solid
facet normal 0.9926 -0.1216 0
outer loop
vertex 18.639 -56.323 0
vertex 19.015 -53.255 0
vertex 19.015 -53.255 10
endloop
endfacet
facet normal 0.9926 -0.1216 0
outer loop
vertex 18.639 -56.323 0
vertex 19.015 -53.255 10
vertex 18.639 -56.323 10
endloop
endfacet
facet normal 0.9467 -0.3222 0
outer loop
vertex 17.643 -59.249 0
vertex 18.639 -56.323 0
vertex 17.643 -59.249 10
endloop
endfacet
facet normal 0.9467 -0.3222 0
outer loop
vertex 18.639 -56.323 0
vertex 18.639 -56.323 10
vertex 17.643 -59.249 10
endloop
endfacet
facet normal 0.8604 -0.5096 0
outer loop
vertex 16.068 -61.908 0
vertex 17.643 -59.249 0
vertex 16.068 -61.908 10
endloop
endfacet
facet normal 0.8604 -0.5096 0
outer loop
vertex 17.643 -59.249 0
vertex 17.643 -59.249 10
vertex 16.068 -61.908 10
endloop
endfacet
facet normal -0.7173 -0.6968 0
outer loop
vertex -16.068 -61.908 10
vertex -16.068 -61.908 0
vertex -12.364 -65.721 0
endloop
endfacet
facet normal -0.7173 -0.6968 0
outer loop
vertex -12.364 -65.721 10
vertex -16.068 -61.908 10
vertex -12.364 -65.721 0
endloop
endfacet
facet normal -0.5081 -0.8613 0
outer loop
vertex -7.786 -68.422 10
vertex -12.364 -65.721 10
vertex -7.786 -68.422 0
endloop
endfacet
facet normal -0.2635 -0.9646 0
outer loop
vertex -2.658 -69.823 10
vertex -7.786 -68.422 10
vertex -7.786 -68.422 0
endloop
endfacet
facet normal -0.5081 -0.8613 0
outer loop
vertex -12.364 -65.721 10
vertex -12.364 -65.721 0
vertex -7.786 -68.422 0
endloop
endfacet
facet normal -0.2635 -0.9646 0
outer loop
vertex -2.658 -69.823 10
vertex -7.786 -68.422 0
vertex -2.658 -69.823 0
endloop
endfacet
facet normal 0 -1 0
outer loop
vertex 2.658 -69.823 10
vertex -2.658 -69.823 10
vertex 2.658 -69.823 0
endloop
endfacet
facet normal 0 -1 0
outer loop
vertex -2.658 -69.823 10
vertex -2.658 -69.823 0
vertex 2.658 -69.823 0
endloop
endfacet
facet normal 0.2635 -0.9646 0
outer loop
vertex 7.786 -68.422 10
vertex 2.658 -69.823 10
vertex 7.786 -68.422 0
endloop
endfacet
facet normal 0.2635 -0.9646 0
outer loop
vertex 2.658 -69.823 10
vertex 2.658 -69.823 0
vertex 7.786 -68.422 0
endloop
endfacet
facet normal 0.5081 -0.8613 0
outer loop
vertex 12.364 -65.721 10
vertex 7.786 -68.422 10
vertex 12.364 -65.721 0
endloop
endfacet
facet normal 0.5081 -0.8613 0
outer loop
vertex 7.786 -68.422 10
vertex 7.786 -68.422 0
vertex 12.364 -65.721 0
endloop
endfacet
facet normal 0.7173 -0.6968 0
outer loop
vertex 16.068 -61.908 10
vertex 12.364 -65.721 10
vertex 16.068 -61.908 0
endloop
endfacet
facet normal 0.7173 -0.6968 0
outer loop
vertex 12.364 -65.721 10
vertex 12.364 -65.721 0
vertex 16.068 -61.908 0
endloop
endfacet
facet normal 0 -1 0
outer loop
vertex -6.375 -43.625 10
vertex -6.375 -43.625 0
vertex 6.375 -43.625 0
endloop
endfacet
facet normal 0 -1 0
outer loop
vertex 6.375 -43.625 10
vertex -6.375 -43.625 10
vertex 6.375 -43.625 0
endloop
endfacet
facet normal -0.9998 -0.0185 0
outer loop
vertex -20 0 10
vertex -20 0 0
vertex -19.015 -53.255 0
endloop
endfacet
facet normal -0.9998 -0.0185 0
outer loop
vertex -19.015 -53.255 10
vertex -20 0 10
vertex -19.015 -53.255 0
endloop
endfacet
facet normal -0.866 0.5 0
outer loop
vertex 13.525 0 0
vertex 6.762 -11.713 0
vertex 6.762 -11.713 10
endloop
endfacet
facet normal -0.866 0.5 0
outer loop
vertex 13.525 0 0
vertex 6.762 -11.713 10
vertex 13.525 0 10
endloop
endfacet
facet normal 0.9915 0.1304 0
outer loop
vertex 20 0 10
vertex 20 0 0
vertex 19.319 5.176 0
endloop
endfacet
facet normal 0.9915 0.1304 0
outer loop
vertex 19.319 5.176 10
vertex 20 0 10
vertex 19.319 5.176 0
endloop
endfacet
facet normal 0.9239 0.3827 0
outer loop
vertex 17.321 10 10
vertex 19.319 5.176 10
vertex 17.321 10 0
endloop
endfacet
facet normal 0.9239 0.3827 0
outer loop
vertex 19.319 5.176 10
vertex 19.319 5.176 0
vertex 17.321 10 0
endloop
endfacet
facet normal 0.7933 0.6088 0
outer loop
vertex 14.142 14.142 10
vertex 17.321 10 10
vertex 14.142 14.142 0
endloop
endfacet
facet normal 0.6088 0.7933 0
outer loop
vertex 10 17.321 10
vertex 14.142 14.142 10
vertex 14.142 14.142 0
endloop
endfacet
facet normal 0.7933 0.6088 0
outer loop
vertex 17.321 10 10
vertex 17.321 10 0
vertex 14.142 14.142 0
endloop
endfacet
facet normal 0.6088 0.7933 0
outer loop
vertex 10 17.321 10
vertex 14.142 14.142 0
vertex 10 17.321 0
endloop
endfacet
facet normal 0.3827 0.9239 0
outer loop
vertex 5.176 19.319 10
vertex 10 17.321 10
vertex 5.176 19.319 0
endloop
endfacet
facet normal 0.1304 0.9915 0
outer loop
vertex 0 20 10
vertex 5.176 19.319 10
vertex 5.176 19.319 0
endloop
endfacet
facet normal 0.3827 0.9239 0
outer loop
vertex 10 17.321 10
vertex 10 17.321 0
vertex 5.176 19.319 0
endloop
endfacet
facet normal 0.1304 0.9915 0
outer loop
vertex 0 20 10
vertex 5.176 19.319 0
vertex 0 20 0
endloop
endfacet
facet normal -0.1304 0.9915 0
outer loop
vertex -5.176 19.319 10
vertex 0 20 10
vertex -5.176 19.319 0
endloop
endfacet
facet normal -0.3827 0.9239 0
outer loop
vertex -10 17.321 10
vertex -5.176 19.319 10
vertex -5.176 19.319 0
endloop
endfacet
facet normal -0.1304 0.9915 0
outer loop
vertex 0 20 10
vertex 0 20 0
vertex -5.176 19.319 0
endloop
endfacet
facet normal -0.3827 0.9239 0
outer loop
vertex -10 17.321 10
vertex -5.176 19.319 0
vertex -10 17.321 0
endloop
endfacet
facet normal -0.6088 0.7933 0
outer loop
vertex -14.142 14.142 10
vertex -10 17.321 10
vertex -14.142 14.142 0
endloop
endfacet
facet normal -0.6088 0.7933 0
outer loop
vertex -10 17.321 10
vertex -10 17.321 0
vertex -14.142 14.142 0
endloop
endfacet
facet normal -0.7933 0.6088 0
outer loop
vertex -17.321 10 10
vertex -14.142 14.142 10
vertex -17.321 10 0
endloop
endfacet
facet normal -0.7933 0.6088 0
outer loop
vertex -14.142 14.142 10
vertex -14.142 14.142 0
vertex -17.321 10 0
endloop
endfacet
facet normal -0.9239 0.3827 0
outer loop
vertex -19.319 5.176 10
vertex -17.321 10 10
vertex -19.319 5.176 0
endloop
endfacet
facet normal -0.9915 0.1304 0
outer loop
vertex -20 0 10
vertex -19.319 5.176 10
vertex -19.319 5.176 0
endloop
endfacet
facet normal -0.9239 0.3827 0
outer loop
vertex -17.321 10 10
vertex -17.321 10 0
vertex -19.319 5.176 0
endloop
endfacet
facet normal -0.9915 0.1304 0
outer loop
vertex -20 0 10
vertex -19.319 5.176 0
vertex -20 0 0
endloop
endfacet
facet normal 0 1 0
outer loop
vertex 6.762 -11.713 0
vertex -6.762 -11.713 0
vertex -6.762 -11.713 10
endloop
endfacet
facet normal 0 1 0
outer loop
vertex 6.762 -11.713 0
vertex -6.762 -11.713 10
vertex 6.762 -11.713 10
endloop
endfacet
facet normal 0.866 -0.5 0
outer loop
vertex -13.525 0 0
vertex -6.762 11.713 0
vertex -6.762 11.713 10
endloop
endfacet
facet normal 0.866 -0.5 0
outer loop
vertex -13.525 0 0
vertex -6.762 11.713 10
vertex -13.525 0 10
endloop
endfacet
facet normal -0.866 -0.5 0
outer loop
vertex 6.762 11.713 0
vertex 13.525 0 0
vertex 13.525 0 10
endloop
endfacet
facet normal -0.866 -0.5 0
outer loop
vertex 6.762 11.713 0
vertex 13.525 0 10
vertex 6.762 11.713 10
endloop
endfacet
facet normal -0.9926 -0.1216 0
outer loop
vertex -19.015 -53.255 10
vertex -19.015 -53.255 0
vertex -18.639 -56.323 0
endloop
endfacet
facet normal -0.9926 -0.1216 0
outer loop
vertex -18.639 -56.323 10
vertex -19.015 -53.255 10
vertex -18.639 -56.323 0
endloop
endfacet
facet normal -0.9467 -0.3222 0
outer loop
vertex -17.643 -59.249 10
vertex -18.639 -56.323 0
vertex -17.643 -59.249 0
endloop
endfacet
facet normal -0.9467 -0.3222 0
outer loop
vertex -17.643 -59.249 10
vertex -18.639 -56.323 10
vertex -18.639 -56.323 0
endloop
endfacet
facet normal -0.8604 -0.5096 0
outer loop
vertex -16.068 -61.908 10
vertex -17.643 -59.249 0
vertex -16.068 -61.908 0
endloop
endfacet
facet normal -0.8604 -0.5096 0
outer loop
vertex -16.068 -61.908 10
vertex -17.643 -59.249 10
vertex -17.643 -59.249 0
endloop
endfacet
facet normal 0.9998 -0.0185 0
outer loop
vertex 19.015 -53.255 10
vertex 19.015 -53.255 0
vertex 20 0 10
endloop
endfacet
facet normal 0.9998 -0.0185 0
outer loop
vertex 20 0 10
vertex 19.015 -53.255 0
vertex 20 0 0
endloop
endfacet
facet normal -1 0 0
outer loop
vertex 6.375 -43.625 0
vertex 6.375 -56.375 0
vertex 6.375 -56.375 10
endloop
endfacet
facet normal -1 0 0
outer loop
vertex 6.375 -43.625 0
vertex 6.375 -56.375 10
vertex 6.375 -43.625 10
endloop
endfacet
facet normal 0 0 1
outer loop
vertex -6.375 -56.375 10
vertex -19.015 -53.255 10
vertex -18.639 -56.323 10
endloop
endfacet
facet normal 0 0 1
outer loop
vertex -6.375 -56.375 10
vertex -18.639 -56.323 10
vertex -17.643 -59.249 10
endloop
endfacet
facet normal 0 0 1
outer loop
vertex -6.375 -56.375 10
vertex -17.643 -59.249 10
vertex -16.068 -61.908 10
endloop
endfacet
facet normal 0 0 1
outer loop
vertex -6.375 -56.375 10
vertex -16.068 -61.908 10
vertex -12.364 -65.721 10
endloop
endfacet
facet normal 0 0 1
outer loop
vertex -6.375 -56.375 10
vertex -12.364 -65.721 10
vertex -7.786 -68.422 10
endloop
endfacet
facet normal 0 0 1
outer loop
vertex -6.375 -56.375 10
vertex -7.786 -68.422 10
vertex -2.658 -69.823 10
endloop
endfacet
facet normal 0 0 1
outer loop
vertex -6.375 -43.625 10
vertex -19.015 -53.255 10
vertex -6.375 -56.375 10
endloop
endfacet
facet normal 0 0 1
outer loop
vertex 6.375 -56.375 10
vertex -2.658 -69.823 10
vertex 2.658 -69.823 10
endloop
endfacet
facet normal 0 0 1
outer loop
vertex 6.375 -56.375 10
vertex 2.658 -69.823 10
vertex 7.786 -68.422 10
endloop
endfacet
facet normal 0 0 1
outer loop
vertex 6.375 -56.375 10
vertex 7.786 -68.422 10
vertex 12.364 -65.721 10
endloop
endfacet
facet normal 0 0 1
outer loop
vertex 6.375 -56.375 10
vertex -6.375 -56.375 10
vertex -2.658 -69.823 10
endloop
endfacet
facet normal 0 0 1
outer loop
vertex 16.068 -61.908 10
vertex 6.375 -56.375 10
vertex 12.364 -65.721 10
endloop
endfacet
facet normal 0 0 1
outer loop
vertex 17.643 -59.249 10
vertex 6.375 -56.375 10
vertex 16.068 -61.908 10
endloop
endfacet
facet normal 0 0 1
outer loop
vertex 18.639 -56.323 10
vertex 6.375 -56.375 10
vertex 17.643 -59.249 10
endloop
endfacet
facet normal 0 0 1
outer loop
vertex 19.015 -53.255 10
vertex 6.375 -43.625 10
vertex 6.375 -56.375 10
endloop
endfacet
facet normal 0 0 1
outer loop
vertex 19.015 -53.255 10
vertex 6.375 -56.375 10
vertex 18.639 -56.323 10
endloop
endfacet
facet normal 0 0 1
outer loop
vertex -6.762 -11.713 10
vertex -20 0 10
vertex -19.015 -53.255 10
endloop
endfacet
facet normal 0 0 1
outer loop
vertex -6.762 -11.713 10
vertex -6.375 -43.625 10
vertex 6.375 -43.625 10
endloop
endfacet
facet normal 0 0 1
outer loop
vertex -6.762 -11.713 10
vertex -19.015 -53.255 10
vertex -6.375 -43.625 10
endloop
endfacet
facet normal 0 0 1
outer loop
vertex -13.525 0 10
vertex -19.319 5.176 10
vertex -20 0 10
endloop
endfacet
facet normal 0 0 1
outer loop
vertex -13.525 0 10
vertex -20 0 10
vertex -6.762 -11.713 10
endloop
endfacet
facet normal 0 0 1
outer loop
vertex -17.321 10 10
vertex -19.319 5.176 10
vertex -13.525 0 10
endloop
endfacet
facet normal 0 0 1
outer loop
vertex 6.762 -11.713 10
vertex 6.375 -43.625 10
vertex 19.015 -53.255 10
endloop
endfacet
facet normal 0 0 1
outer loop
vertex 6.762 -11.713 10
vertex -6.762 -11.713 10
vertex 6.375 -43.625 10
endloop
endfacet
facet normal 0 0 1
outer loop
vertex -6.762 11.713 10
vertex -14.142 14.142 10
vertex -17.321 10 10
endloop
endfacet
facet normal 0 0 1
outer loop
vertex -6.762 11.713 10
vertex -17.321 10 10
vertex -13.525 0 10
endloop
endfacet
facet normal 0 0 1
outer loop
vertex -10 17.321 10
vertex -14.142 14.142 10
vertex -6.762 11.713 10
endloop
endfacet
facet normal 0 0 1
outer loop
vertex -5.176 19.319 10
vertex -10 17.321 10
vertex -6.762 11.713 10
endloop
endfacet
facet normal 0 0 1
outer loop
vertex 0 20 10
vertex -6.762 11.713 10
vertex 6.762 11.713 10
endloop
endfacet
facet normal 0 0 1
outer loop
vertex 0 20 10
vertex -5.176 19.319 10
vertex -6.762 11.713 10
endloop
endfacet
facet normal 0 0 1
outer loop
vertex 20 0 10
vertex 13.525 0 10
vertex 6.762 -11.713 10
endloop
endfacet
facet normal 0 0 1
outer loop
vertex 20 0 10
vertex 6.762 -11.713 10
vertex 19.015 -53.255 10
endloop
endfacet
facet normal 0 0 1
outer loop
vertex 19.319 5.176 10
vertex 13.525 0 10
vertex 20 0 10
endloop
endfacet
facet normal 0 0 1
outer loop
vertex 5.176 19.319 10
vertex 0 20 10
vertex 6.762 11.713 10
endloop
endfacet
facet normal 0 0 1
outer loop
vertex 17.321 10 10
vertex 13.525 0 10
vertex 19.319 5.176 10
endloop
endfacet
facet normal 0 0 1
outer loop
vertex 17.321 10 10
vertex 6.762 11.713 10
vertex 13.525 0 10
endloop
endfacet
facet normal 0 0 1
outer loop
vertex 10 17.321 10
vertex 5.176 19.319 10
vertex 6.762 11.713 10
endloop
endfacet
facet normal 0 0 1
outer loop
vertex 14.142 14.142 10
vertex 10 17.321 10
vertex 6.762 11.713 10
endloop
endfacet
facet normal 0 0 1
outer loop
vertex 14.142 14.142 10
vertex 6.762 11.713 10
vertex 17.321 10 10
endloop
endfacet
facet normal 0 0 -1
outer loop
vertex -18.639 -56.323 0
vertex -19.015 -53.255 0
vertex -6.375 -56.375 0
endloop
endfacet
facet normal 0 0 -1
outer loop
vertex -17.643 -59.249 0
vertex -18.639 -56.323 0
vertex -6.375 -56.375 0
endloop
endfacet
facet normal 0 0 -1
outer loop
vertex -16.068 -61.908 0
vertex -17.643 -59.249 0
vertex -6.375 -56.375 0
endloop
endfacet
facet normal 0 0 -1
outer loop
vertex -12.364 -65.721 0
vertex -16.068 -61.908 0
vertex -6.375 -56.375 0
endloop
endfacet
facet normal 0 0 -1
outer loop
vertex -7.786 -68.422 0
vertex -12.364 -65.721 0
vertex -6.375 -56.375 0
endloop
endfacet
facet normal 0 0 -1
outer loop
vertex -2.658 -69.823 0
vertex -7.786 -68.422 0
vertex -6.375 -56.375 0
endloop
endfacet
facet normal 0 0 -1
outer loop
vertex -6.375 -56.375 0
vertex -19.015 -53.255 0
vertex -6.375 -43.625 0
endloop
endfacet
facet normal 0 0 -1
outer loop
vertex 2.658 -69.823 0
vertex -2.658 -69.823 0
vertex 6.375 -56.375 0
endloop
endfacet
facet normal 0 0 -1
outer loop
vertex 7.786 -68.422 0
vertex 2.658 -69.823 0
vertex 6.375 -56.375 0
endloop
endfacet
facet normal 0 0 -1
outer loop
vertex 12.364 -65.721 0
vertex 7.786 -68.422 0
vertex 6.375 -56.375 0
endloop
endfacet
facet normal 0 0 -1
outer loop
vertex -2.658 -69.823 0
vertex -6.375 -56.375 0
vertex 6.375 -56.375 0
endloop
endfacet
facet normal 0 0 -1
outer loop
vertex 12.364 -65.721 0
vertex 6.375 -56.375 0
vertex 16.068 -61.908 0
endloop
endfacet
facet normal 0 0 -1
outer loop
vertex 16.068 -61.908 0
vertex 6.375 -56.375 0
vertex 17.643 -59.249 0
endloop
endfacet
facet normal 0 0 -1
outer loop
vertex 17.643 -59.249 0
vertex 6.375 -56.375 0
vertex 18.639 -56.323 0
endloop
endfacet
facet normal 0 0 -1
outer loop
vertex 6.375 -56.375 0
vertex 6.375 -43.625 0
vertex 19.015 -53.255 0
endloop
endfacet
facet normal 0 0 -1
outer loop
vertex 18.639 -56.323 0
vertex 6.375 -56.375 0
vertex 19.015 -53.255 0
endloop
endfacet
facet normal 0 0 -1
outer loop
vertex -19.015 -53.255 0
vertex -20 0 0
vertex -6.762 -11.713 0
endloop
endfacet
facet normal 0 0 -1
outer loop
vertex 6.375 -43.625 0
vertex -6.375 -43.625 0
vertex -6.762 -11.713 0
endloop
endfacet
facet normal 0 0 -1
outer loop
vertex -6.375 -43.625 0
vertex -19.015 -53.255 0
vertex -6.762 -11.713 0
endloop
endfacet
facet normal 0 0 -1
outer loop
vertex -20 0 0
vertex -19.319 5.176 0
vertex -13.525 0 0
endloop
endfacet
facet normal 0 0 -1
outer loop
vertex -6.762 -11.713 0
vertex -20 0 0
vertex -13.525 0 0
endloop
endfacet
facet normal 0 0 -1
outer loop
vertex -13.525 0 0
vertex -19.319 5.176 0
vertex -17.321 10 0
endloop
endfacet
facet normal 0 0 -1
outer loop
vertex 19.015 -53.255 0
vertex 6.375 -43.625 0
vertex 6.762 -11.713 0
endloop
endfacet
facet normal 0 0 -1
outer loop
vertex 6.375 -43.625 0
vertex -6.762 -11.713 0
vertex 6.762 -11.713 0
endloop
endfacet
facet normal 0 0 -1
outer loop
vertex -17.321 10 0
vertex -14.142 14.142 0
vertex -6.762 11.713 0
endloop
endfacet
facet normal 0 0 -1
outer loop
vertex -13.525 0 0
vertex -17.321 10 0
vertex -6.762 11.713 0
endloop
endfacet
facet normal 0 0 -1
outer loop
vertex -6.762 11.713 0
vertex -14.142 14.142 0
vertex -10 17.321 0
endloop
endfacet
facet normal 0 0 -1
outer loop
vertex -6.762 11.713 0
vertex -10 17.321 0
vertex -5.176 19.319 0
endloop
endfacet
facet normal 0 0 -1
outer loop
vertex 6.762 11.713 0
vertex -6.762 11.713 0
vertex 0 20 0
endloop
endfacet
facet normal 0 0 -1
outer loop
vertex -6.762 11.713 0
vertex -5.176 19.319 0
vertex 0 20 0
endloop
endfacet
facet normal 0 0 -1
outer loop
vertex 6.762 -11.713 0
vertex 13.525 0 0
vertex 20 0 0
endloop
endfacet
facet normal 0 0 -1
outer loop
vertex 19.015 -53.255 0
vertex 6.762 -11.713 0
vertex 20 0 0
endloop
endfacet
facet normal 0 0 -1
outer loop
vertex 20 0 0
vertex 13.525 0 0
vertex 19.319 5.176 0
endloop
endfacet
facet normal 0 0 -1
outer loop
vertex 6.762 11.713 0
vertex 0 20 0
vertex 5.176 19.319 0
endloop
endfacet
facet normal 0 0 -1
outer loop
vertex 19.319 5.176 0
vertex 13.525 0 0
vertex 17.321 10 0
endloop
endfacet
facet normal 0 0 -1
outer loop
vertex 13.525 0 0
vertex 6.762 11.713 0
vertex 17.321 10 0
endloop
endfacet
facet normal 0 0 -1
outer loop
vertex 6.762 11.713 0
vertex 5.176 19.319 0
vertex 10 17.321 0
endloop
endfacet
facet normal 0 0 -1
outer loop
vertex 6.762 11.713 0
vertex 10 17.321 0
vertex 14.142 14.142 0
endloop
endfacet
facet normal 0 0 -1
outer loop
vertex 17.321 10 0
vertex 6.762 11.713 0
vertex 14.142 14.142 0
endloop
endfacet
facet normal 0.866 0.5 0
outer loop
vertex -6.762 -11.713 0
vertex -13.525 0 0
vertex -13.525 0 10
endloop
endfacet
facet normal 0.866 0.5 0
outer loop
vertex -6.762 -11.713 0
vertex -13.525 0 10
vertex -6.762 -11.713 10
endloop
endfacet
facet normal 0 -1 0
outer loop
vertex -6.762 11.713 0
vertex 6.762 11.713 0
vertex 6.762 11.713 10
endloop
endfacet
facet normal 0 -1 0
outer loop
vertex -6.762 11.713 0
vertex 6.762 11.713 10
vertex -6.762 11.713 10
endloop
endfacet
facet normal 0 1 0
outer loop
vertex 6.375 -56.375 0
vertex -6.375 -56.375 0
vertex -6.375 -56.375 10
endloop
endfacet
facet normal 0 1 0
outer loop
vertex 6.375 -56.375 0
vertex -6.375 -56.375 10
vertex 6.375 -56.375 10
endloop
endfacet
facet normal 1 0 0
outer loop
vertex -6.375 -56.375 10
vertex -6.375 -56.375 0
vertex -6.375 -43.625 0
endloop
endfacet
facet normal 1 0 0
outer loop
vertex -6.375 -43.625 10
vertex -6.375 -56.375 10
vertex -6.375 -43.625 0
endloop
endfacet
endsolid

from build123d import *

# Parameters (mm, degrees)
SKETCH_W  = 12.75
SKETCH_H  = 12.75
PAD_DEPTH = 10
FILLET_R  = 15


with BuildPart() as part:
    # Sketch → Pad (new body)
    with BuildSketch(Plane.XY):
        with BuildLine():
            ThreePointArc((20, 0), (0, 20), (-20, 0))
            Line((-20, 0), (-18.956776, -56.375))
            ThreePointArc((-18.956776, -56.375), (0, -70), (18.956776, -56.375))
            Line((18.956776, -56.375), (20, 0))
        make_face()
        Polygon((-13.525, 0), (-6.7625, -11.712994), (6.7625, -11.712994), (13.525, 0), (6.7625, 11.712994), (-6.7625, 11.712994), align=None, mode=Mode.SUBTRACT)
        with Locations((0, -50)):
            Rectangle(SKETCH_W, SKETCH_H, mode=Mode.SUBTRACT)
    extrude(amount=PAD_DEPTH)

    # Fillet
    fillet_edges = [part.edges().sort_by_distance(p)[0] for p in [
        (-20, 0, 5),
        (-18.956776, -56.375, 5),
        (18.956776, -56.375, 5),
        (20, 0, 5),
    ]]
    fillet(fillet_edges, radius=FILLET_R)


solid = part.part
